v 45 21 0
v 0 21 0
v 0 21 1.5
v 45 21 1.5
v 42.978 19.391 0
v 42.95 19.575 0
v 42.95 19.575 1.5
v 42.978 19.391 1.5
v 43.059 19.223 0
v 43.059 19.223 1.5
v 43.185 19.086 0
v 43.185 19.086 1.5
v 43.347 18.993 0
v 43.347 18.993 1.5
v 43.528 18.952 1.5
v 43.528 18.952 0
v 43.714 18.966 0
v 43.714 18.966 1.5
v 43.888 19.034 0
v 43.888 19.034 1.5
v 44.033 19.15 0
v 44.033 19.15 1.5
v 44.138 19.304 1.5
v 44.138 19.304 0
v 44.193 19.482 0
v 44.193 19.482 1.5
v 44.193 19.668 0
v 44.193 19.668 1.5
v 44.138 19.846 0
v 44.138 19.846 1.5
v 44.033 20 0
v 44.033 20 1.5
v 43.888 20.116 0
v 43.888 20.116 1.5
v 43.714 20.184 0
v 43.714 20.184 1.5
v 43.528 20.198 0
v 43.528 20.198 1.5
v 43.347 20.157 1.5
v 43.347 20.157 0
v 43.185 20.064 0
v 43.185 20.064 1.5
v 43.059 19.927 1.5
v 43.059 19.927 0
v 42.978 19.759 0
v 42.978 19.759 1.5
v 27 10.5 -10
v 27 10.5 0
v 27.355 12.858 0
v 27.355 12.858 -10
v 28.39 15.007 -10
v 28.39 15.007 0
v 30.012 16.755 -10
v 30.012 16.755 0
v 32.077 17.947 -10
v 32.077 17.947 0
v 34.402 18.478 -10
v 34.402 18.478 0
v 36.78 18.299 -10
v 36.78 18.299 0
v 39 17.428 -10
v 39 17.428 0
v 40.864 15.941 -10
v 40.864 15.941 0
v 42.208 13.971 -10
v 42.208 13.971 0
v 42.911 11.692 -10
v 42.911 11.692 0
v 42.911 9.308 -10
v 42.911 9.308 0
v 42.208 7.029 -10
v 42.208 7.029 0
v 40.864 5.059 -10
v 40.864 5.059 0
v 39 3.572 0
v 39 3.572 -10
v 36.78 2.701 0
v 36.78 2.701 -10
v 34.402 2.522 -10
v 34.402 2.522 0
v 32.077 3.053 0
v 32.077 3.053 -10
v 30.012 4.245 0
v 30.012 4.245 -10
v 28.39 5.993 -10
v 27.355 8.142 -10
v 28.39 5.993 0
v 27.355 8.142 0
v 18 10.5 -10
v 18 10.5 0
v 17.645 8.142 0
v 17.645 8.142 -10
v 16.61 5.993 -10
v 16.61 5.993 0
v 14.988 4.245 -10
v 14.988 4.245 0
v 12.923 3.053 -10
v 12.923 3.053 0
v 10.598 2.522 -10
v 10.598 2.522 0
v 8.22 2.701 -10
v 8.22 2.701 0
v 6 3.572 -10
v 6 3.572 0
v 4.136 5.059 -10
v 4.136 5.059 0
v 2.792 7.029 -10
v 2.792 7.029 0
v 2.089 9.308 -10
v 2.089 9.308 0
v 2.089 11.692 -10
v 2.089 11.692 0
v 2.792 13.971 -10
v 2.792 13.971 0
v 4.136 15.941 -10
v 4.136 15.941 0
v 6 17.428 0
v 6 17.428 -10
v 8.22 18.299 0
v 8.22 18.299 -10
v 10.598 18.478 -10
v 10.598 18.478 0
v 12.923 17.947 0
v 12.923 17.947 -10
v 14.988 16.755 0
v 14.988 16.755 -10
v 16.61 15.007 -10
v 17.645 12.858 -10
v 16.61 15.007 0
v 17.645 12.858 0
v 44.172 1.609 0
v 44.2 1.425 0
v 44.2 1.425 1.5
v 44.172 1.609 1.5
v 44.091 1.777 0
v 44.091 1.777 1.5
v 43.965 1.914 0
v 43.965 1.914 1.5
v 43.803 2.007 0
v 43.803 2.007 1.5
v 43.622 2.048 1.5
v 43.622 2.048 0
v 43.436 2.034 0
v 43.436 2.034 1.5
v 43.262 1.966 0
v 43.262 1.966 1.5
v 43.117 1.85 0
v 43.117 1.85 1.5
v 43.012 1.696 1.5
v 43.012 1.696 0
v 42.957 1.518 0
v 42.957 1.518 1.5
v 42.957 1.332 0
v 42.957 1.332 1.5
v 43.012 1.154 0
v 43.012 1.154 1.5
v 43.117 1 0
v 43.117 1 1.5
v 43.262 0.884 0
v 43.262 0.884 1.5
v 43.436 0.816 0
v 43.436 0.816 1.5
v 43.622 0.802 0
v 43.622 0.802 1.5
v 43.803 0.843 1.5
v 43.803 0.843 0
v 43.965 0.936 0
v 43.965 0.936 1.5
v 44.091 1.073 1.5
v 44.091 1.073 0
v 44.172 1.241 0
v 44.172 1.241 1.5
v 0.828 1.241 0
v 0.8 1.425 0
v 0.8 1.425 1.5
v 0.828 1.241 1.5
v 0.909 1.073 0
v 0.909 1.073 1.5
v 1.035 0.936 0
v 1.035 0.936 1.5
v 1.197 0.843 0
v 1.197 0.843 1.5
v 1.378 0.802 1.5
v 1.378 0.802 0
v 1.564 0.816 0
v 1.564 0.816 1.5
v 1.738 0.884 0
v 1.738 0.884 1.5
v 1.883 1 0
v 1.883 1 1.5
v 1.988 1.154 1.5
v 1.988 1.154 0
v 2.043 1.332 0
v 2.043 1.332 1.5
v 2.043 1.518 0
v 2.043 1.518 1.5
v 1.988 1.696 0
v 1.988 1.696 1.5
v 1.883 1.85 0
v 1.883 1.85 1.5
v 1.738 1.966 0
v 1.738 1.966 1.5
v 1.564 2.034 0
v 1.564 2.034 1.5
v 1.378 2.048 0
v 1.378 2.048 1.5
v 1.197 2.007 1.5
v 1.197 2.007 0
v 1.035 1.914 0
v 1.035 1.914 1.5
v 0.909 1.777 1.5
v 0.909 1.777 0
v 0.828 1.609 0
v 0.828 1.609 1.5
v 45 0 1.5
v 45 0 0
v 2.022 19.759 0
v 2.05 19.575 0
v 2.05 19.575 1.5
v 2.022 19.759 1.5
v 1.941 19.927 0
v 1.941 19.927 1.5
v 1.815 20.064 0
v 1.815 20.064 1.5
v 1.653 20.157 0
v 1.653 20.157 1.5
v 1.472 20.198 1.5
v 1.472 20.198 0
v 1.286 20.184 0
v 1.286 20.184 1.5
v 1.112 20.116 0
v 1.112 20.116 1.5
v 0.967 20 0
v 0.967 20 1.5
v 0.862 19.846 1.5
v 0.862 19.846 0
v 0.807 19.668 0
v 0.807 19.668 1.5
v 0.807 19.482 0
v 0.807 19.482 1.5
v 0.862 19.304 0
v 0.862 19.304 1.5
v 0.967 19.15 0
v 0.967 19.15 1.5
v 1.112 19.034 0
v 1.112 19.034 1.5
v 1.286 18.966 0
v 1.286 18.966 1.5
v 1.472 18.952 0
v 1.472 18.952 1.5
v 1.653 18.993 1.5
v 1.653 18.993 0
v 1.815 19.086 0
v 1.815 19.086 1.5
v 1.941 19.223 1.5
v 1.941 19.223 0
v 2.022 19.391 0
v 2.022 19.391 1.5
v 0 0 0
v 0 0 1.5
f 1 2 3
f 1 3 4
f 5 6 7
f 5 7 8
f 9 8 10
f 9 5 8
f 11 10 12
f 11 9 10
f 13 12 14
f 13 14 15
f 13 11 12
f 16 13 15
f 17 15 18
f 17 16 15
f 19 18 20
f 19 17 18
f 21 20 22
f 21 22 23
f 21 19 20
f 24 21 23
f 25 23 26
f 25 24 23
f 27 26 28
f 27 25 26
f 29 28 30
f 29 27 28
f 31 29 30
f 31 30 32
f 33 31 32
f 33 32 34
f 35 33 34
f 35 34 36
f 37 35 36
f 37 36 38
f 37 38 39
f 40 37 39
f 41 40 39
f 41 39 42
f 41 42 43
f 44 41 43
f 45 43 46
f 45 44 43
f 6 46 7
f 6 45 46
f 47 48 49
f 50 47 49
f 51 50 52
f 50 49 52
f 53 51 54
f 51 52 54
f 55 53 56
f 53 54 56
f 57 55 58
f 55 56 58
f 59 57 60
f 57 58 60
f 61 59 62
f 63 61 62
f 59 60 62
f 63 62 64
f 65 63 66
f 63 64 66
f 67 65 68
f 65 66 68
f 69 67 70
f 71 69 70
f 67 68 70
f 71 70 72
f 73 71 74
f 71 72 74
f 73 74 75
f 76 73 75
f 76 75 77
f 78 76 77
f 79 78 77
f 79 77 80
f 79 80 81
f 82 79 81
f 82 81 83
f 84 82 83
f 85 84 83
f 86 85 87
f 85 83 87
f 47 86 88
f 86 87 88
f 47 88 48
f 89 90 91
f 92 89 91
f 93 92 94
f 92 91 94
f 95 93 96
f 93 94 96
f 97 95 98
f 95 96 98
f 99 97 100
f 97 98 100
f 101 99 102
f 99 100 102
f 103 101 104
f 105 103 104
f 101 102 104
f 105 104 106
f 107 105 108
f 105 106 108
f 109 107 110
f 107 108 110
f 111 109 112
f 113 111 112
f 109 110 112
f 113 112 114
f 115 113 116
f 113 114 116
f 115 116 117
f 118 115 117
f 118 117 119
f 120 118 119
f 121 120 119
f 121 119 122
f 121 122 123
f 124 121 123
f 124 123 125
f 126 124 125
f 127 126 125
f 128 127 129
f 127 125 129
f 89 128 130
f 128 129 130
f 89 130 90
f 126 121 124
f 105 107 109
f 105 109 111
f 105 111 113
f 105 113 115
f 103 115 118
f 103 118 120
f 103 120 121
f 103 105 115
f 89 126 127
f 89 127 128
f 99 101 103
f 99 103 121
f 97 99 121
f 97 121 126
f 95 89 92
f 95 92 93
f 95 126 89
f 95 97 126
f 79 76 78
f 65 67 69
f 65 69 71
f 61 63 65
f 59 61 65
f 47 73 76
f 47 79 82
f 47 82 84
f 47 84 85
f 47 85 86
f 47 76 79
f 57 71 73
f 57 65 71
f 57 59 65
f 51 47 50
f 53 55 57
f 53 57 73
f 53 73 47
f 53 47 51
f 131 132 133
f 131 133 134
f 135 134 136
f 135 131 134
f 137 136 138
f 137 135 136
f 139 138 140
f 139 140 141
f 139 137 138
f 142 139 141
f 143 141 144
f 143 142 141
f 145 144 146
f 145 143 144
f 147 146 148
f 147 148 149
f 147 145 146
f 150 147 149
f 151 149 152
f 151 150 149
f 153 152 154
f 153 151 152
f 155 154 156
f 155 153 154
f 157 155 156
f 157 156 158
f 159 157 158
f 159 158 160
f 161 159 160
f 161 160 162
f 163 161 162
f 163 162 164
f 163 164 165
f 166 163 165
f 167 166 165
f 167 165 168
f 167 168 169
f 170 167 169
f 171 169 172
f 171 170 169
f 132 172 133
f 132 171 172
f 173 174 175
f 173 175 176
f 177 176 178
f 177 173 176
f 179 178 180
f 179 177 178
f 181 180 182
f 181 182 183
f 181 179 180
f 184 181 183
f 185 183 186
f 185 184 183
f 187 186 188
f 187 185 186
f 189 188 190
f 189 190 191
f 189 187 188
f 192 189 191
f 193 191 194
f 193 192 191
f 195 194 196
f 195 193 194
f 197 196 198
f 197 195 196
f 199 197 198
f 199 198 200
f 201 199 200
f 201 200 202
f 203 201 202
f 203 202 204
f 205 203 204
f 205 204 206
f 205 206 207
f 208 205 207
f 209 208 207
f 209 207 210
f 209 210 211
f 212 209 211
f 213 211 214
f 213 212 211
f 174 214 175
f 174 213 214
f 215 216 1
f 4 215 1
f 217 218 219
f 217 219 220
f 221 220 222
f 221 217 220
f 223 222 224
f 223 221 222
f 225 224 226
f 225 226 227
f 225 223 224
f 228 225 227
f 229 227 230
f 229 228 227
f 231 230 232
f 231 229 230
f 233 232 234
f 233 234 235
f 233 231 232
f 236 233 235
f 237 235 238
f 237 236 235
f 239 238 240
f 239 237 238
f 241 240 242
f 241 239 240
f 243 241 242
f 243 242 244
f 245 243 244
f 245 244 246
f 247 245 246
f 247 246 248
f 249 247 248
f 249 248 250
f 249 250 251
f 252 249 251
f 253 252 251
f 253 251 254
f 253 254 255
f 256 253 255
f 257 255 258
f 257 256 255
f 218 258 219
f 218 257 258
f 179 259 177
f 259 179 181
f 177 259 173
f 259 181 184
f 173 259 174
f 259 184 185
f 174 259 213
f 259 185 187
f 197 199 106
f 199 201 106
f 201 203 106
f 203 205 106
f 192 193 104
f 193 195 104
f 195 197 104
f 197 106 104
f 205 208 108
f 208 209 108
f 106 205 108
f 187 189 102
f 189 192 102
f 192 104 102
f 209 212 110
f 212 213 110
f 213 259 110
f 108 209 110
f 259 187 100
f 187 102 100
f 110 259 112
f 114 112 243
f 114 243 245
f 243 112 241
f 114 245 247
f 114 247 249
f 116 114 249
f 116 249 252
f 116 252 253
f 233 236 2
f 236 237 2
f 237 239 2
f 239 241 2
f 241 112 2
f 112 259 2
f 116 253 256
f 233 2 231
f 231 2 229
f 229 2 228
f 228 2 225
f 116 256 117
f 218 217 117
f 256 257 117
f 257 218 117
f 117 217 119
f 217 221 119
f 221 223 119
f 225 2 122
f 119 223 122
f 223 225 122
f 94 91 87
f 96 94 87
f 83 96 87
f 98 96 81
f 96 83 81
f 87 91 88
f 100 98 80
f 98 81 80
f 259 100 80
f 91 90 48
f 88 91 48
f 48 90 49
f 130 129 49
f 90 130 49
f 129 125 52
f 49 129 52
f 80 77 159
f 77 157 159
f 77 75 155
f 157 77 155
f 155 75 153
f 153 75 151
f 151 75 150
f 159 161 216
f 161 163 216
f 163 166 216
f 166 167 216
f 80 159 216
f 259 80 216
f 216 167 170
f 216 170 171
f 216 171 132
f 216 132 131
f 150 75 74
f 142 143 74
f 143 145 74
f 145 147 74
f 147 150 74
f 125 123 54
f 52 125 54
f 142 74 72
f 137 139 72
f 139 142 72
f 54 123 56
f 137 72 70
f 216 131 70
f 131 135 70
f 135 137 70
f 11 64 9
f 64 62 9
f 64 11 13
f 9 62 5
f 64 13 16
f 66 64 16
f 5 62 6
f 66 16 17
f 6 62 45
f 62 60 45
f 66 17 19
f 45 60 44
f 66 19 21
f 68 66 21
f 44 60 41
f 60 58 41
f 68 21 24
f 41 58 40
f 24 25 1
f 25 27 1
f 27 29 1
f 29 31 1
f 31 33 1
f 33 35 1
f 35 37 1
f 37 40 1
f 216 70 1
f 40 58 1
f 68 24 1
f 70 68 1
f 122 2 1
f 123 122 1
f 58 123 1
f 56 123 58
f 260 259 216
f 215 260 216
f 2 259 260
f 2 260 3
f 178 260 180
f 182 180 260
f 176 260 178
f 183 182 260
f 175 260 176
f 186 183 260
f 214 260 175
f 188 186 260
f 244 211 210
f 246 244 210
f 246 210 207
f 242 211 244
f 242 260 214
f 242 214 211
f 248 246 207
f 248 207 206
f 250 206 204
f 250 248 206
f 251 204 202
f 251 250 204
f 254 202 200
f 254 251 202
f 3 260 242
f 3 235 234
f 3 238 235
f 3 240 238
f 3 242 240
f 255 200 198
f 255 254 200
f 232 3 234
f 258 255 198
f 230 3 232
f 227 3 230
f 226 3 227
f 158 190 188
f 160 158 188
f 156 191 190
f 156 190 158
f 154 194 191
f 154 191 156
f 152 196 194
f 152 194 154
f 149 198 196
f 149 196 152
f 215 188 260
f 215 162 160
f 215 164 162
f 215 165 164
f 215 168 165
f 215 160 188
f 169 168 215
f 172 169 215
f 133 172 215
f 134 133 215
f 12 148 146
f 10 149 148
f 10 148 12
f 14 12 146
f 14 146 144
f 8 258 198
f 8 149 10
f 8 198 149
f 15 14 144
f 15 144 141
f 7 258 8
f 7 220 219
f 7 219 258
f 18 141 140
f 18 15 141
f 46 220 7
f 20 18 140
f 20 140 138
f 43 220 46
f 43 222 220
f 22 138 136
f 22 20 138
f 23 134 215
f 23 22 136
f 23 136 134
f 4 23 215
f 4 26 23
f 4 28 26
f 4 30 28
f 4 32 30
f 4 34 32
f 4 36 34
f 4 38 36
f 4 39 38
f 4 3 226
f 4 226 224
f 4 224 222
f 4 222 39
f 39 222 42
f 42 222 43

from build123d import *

# Parameters (mm, degrees)
CROQUIS1_W              = 45
CROQUIS1_H              = 21
CROQUIS1_R              = 0.625
SALIENTE_EXTRUIR1_DEPTH = 1.5
CROQUIS2_R              = 8
SALIENTE_EXTRUIR2_DEPTH = 10


with BuildPart() as part:
    # Croquis1 → Saliente-Extruir1 (new body)
    with BuildSketch(Plane.XY):
        with Locations((22.5, 10.5)):
            Rectangle(CROQUIS1_W, CROQUIS1_H)
        with Locations((1.425, 19.575)):
            Circle(CROQUIS1_R, mode=Mode.SUBTRACT)
        with Locations(Location((43.575, 19.575, 0), (0, 0, 180))):
            Circle(CROQUIS1_R, mode=Mode.SUBTRACT)
        with Locations((43.575, 1.425)):
            Circle(CROQUIS1_R, mode=Mode.SUBTRACT)
        with Locations(Location((1.425, 1.425, 0), (0, 0, 180))):
            Circle(CROQUIS1_R, mode=Mode.SUBTRACT)
    extrude(amount=SALIENTE_EXTRUIR1_DEPTH)

    # Croquis2 → Saliente-Extruir2 (add)
    with BuildSketch(Plane(origin=(0, 0, 0), x_dir=(-1, 0, 0), z_dir=(0, 0, -1))):
        with Locations((-35, 10.5)):
            Circle(CROQUIS2_R)
        with Locations(Location((-10, 10.5, 0), (0, 0, 180))):
            Circle(CROQUIS2_R)
    extrude(amount=SALIENTE_EXTRUIR2_DEPTH)


solid = part.part
